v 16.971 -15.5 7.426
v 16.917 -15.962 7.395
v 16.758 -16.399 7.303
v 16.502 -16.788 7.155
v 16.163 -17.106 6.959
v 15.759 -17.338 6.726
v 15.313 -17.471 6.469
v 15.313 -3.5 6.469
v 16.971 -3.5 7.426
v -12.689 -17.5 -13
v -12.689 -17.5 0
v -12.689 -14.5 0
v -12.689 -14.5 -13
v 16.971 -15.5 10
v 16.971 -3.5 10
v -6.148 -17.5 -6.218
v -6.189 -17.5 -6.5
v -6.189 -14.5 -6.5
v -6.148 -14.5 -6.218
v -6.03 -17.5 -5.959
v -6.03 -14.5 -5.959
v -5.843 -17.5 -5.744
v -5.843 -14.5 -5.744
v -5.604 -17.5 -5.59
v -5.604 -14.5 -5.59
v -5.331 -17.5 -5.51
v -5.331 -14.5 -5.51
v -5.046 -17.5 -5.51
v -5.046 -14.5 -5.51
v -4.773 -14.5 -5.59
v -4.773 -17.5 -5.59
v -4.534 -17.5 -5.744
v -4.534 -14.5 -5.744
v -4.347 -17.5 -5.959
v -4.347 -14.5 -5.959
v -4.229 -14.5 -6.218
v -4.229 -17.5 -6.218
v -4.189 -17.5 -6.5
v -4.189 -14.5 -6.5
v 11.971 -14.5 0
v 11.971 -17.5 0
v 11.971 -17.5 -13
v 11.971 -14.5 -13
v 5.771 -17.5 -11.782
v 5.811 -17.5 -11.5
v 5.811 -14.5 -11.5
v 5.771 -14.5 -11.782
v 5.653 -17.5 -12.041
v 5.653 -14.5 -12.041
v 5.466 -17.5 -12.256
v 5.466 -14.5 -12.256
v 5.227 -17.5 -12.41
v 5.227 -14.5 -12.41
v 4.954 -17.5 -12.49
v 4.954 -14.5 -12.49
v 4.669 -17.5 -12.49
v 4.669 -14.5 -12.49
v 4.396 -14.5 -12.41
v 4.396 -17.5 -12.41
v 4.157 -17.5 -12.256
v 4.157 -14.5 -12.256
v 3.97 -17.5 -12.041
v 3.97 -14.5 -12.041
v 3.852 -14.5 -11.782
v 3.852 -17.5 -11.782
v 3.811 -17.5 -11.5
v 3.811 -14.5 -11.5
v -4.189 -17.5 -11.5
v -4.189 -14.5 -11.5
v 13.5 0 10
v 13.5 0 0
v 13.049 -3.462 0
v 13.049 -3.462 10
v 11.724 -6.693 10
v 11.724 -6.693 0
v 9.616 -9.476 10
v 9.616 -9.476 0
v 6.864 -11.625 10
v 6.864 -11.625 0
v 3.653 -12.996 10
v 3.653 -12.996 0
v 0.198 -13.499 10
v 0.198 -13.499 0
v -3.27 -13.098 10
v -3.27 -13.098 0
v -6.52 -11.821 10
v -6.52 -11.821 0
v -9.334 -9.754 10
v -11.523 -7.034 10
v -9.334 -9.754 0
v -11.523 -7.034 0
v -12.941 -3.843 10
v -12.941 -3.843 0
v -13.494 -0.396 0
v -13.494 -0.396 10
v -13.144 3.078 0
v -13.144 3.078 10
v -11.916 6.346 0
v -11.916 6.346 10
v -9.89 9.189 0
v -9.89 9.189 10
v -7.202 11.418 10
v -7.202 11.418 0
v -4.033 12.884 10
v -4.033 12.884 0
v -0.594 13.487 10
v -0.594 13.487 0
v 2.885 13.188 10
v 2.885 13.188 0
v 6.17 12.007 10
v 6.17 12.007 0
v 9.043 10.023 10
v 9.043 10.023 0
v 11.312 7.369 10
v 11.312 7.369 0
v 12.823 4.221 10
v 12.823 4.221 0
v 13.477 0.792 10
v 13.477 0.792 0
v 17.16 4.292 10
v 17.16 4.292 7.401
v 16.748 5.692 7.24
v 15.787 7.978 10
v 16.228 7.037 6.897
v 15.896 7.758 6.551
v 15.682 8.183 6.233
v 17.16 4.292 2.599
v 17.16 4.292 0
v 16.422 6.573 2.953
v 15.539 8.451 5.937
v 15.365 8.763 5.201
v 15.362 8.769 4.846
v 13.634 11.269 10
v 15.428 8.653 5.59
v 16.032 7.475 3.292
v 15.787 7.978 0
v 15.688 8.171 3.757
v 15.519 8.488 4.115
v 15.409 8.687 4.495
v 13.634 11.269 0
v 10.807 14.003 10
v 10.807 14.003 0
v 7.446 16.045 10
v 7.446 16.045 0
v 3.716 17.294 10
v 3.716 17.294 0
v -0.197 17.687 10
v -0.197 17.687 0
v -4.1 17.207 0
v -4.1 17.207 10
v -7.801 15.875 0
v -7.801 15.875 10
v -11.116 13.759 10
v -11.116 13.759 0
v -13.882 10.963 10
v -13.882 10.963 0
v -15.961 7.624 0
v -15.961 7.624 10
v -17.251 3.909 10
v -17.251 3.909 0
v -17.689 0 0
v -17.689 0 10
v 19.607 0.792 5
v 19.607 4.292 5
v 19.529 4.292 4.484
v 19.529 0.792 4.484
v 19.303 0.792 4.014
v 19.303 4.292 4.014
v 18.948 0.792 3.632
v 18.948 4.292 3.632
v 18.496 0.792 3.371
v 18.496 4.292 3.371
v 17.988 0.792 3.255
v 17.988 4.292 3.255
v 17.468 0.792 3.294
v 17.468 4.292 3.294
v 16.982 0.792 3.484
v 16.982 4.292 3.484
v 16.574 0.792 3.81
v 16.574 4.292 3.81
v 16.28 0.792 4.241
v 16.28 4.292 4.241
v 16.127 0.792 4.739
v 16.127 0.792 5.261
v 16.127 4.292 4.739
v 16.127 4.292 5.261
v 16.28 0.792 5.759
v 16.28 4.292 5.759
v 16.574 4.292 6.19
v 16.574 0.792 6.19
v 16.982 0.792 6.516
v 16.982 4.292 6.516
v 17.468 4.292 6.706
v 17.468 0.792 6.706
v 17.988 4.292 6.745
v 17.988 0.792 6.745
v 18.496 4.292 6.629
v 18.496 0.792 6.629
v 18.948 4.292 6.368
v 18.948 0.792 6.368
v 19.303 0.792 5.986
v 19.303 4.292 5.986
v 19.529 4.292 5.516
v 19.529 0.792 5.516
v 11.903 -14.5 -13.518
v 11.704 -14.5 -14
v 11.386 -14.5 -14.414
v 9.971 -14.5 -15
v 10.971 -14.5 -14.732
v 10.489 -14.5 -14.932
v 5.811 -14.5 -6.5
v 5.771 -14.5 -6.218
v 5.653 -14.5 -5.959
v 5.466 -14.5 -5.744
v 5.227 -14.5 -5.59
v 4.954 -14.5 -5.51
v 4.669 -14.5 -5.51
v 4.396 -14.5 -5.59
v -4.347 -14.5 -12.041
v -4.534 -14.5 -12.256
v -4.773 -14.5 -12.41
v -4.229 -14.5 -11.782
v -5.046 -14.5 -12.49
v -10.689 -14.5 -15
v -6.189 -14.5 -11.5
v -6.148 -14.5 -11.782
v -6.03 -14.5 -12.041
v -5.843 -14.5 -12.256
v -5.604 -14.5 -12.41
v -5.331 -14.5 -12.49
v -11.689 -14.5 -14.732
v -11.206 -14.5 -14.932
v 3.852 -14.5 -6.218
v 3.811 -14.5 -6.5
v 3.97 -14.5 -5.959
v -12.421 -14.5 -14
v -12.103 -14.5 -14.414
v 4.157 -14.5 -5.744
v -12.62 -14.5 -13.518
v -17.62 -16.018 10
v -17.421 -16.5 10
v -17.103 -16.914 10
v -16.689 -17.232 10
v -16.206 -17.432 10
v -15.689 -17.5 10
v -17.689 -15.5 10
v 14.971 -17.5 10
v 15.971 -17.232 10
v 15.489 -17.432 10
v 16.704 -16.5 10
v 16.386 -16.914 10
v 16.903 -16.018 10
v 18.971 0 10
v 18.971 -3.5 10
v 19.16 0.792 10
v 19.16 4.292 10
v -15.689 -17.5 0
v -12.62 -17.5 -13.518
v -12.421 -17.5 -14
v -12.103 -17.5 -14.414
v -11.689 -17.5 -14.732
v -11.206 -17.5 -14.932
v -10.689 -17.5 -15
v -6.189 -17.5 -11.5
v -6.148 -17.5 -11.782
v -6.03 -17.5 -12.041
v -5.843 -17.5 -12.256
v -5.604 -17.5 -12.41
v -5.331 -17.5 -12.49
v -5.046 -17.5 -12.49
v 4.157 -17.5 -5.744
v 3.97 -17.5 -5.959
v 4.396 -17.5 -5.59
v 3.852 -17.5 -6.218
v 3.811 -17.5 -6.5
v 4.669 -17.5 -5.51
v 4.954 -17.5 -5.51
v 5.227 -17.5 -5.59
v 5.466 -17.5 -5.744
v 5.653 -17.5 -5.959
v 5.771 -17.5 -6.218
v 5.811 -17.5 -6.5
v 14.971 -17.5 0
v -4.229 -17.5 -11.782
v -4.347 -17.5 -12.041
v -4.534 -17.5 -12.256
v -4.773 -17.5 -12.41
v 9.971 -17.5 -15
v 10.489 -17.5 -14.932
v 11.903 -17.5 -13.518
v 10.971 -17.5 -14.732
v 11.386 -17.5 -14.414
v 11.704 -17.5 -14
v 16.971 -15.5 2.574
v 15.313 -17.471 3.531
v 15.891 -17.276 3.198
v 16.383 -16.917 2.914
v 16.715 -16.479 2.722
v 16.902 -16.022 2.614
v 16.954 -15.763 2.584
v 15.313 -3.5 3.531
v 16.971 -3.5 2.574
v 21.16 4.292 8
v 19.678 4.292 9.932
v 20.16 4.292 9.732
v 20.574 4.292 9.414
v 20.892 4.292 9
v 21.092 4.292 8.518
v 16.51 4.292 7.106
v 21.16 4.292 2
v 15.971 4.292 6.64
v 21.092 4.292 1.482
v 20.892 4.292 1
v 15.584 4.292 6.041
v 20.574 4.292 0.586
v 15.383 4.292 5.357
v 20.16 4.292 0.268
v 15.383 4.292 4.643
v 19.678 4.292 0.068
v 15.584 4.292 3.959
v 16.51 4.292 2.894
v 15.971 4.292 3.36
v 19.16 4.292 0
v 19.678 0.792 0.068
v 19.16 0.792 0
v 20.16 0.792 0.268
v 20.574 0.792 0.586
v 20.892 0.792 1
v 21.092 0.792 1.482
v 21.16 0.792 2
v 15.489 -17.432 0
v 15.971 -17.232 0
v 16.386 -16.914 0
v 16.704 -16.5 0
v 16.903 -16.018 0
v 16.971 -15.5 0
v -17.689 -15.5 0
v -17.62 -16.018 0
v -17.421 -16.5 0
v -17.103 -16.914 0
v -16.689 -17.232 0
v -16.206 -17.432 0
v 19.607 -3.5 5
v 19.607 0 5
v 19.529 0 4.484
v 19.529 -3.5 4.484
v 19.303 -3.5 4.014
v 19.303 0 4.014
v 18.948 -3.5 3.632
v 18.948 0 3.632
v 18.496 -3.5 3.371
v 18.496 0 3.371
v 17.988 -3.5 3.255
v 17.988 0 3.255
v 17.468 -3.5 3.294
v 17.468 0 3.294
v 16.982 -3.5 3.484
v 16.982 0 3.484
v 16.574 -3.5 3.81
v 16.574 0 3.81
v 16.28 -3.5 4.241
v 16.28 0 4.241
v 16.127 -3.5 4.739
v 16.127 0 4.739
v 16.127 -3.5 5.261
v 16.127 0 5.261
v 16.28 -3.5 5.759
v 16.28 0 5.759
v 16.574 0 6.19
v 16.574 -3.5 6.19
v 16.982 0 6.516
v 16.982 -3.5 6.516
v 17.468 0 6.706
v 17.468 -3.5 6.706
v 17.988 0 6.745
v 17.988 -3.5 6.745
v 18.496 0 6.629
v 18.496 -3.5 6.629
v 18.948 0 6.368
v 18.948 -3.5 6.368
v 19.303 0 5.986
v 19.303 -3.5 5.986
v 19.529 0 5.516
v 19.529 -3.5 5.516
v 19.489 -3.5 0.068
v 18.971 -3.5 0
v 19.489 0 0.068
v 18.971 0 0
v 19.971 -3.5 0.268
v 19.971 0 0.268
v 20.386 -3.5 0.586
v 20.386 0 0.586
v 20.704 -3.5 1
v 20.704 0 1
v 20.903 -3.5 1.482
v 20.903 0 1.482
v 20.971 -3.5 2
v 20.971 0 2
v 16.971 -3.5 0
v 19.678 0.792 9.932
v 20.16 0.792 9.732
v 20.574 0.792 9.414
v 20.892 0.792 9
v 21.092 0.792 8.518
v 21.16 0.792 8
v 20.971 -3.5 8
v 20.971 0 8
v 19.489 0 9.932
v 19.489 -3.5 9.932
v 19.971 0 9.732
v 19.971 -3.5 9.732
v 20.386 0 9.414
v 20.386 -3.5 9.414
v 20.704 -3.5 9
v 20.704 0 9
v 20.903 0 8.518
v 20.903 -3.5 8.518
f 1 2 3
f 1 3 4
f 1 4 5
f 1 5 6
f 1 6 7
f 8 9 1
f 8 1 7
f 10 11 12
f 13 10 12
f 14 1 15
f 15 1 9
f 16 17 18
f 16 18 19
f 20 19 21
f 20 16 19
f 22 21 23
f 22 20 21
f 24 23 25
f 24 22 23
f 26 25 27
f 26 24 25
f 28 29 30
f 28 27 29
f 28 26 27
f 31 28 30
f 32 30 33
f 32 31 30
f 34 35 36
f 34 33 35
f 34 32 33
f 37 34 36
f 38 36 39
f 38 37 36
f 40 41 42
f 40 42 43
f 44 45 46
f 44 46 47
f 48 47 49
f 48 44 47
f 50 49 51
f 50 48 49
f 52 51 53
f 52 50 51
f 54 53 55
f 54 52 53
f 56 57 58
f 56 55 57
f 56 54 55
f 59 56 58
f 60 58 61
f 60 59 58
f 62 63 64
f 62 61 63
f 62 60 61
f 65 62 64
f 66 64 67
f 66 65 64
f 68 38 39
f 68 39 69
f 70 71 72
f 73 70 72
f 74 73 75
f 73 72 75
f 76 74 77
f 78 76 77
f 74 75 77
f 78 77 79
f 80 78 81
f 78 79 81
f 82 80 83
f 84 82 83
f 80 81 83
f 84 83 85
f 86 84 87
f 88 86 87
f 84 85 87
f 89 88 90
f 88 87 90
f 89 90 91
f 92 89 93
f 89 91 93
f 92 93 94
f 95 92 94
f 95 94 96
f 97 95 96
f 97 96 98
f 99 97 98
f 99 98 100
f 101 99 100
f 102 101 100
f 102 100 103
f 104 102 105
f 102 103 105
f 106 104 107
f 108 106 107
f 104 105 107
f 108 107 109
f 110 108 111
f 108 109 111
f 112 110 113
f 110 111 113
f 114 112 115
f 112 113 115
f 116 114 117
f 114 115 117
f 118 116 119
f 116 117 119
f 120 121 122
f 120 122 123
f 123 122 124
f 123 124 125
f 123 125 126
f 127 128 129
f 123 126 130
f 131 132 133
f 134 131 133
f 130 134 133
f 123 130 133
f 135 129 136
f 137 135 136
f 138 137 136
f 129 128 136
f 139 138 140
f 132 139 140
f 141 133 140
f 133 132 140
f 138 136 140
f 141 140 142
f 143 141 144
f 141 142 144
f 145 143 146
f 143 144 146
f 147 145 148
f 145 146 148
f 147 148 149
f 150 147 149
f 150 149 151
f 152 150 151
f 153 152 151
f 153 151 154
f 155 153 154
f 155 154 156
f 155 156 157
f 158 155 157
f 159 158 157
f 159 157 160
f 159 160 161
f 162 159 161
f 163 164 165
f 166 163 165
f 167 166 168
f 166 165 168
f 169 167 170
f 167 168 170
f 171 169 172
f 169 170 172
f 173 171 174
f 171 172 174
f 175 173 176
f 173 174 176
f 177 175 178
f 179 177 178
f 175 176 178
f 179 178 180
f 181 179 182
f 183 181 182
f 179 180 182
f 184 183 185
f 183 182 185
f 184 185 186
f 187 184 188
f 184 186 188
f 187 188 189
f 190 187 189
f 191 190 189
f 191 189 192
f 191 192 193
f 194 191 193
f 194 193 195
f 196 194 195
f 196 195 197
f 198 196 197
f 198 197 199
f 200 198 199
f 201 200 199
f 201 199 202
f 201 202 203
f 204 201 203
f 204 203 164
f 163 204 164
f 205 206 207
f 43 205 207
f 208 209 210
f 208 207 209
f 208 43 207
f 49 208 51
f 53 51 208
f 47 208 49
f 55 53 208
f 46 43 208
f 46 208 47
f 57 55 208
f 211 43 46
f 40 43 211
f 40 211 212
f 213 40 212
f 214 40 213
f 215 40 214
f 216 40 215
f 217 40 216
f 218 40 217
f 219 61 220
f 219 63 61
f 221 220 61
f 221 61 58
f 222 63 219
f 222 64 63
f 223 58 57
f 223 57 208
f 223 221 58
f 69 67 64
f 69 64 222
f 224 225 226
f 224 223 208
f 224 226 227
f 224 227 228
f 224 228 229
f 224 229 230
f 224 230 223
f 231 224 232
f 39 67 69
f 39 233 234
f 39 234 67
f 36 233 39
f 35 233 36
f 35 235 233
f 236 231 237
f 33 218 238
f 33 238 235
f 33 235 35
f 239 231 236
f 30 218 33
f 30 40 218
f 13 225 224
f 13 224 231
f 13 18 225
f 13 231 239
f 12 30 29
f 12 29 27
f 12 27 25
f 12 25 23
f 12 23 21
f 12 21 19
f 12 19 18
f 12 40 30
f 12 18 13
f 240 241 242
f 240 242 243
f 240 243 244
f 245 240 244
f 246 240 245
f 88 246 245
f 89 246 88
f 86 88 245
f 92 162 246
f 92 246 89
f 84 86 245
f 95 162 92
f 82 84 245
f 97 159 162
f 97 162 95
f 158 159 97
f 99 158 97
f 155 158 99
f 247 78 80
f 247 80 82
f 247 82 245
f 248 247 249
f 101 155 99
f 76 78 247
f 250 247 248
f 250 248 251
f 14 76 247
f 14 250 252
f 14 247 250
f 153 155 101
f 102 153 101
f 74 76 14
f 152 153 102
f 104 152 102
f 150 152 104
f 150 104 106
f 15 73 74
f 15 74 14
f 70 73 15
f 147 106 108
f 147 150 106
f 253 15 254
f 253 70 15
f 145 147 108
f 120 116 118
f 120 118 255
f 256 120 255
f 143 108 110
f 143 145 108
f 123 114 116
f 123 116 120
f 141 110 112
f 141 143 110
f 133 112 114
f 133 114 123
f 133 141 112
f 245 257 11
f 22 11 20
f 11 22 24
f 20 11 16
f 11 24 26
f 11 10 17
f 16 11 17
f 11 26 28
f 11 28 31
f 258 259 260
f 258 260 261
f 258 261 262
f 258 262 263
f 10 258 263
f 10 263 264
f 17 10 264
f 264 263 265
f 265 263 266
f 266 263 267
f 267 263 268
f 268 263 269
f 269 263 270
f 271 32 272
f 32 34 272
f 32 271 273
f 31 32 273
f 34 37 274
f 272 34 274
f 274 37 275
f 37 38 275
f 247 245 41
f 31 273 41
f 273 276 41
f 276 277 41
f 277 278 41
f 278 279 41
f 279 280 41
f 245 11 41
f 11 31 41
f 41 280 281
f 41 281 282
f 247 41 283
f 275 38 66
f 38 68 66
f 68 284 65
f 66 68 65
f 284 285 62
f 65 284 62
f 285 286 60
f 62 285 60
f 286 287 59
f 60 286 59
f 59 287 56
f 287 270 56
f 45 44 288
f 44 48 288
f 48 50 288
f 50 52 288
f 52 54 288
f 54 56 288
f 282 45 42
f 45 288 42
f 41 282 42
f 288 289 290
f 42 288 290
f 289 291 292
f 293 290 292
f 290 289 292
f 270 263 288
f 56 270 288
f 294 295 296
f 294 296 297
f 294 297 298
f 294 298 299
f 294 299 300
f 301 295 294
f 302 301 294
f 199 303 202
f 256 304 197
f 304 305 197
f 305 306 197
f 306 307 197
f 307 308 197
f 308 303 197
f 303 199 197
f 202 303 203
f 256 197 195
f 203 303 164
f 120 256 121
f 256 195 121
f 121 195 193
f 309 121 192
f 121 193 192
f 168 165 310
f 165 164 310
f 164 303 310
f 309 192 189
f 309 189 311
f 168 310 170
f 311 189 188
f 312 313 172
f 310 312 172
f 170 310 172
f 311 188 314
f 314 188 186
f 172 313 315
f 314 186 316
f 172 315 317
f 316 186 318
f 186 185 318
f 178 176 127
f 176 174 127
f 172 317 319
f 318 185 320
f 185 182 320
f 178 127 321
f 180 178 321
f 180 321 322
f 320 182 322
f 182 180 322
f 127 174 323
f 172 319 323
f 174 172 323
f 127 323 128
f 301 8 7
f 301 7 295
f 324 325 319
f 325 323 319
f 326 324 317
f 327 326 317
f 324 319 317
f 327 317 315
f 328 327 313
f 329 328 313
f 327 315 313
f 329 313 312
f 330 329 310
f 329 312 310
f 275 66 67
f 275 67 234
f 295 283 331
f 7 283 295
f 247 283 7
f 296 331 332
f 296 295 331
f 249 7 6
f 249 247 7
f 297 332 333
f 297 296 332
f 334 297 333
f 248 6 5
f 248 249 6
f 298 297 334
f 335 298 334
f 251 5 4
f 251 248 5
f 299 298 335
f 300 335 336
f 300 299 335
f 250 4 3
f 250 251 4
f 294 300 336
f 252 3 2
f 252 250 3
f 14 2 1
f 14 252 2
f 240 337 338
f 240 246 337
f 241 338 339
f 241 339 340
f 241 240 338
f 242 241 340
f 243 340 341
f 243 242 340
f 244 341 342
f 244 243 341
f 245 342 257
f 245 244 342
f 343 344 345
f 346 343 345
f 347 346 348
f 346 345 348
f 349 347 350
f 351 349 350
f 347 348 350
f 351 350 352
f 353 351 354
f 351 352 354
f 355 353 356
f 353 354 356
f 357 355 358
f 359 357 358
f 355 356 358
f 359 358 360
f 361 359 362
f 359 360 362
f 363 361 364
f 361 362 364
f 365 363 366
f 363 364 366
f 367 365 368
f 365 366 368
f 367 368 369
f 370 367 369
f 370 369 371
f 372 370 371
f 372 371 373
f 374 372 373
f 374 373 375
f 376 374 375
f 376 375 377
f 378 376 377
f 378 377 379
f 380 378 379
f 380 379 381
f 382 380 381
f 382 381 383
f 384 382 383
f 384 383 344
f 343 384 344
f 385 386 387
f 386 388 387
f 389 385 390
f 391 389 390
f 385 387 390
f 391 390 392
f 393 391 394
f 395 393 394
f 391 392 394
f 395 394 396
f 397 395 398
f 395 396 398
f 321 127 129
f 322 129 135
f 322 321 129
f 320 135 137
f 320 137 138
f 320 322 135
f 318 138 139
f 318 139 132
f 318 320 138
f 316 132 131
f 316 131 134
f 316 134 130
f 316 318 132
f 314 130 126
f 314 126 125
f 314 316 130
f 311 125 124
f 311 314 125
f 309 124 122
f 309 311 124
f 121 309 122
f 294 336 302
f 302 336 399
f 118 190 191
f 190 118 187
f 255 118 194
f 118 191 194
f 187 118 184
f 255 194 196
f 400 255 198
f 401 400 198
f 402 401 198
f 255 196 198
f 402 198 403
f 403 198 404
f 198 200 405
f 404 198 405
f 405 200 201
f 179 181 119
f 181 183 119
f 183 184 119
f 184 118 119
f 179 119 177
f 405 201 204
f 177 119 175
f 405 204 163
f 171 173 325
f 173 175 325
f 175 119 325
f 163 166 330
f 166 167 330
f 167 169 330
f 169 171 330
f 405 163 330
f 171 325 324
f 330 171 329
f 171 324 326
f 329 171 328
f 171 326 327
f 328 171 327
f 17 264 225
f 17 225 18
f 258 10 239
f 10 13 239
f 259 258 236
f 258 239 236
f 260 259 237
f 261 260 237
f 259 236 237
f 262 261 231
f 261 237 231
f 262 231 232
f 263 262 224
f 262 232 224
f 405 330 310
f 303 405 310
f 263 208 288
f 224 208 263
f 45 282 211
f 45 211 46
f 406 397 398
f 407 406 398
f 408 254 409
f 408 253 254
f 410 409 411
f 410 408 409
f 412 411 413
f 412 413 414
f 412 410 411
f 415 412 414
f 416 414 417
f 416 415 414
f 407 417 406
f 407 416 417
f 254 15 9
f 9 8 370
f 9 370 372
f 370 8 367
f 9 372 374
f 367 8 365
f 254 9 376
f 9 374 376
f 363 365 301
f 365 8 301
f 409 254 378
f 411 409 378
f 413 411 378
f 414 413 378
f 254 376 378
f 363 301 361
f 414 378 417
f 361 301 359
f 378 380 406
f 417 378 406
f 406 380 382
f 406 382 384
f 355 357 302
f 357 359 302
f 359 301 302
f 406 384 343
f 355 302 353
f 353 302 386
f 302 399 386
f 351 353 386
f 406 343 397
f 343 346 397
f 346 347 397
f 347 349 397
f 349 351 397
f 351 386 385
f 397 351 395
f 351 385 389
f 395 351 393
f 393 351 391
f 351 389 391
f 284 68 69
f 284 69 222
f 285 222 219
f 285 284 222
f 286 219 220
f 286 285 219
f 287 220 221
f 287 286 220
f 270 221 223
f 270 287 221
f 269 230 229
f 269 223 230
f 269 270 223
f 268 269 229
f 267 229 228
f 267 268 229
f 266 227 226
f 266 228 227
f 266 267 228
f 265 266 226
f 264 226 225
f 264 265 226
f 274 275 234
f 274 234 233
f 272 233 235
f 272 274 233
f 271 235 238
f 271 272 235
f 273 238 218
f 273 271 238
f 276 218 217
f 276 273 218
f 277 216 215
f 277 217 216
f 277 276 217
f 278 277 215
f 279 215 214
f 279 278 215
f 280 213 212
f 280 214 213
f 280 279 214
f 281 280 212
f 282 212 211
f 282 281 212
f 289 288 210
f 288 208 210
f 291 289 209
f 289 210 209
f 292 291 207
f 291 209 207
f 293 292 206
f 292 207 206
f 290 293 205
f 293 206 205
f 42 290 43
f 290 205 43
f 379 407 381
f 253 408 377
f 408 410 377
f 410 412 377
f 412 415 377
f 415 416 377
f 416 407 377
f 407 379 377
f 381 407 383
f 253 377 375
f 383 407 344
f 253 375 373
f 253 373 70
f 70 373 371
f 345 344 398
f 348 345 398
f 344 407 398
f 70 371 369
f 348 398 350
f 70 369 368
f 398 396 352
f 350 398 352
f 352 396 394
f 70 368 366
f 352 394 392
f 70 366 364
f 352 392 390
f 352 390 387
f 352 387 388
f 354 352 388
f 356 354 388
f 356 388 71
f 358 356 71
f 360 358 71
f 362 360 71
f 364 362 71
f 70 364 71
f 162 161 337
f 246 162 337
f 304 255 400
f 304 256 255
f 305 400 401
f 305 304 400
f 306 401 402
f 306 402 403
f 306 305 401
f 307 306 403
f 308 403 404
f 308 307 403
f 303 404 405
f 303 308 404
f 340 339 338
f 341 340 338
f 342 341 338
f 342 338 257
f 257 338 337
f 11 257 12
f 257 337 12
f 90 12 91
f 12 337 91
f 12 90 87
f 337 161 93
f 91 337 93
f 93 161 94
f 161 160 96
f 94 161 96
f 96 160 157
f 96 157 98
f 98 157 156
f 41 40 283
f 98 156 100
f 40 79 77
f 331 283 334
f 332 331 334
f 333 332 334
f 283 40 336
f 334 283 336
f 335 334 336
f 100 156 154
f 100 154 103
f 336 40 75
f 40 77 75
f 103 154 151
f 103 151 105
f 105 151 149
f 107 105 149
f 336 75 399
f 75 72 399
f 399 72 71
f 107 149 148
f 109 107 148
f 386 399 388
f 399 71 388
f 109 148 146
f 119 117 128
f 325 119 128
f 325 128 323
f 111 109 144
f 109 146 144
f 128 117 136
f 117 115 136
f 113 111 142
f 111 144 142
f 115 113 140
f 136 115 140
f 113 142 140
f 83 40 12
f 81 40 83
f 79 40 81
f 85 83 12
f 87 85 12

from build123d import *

# Parameters (mm, degrees)
SALIENTE_EXTRUIR1_DEPTH    = 10
CROQUIS2_W                 = 24.660026533
CROQUIS2_H                 = 3
SALIENTE_EXTRUIR2_DEPTH    = 15
CORTAR_EXTRUIR1_DEPTH      = 15
REDONDEO1_R                = 2
CROQUIS4_R                 = 1.75
CORTAR_EXTRUIR2_DEPTH      = 15
CORTAR_EXTRUIR2_DEPTH_BACK = 25
CROQUIS5_R                 = 2.5
CORTAR_EXTRUIR3_DEPTH      = 25
CORTAR_EXTRUIR4_DEPTH      = 25


with BuildPart() as part:
    # Croquis1 → Saliente-Extruir1 (new body)
    with BuildSketch(Plane.XY):
        with BuildLine():
            Line((-17.688572934, 0), (-17.688572934, -17.5))
            Line((-17.688572934, -17.5), (16.971453599, -17.5))
            Line((16.971453599, -17.5), (16.971453599, -3.5))
            Line((16.971453599, -3.5), (20.971453599, -3.5))
            Line((20.971453599, -3.5), (20.971453599, 0))
            Line((20.971453599, 0), (13.5, 0))
            ThreePointArc((13.5, 0), (-13.494189444, -0.396044516), (13.476762776, 0.791748108))
            Line((13.476762776, 0.791748108), (21.160026533, 0.791748108))
            Line((21.160026533, 0.791748108), (21.160026533, 4.291748108))
            Line((21.160026533, 4.291748108), (17.160026533, 4.291748108))
            ThreePointArc((17.160026533, 4.291748108), (-2.162085979, 17.555939071), (-17.688572934, 0))
        make_face()
    extrude(amount=SALIENTE_EXTRUIR1_DEPTH)

    # Croquis2 → Saliente-Extruir2 (add)
    with BuildSketch(Plane(origin=(0, 0, 0), x_dir=(-1, 0, 0), z_dir=(0, 0, -1))):
        with Locations((0.358559668, -16)):
            Rectangle(CROQUIS2_W, CROQUIS2_H)
    extrude(amount=SALIENTE_EXTRUIR2_DEPTH)

    # Croquis3 → Cortar-Extruir1 (cut)
    with BuildSketch(Plane.XZ.offset(17.5)):
        with BuildLine():
            Line((5.811427066, -6.5), (5.811427066, -11.5))
            ThreePointArc((5.811427066, -11.5), (4.811427066, -12.5), (3.811427066, -11.5))
            Line((3.811427066, -11.5), (3.811427066, -6.5))
            ThreePointArc((3.811427066, -6.5), (4.811427066, -5.5), (5.811427066, -6.5))
        make_face()
        with BuildLine():
            Line((-4.188572934, -6.5), (-4.188572934, -11.5))
            ThreePointArc((-4.188572934, -11.5), (-5.188572934, -12.5), (-6.188572934, -11.5))
            Line((-6.188572934, -11.5), (-6.188572934, -6.5))
            ThreePointArc((-6.188572934, -6.5), (-5.188572934, -5.5), (-4.188572934, -6.5))
        make_face()
    extrude(amount=-CORTAR_EXTRUIR1_DEPTH, mode=Mode.SUBTRACT)

    # Redondeo1
    redondeo1_edges = [part.edges().sort_by_distance(p)[0] for p in [
        (16.971453599, -17.5, 5),
        (-17.688572934, -17.5, 5),
        (11.971453599, -16, -15),
        (-12.688572934, -16, -15),
        (21.160026533, 2.541748108, 10),
        (20.971453599, -1.75, 10),
        (20.971453599, -1.75, 0),
        (21.160026533, 2.541748108, 0),
    ]]
    fillet(redondeo1_edges, radius=REDONDEO1_R)

    # Croquis4 → Cortar-Extruir2 (cut, two sides)
    with BuildSketch(Plane(origin=(0, 4.291748108, 0), x_dir=(1, 0, 0), z_dir=(0, 1, 0))) as cortar_extruir2_sk:
        with Locations((17.857152829, -5)):
            Circle(CROQUIS4_R)
    extrude(amount=CORTAR_EXTRUIR2_DEPTH, mode=Mode.SUBTRACT)
    extrude(cortar_extruir2_sk.sketch, amount=-CORTAR_EXTRUIR2_DEPTH_BACK, mode=Mode.SUBTRACT)

    # Croquis5 → Cortar-Extruir3 (cut)
    with BuildSketch(Plane(origin=(0, 4.291748108, 0), x_dir=(1, 0, 0), z_dir=(0, 1, 0))):
        with Locations((17.857152829, -5)):
            Circle(CROQUIS5_R)
    extrude(amount=CORTAR_EXTRUIR3_DEPTH, mode=Mode.SUBTRACT)

    # Croquis8 → Cortar-Extruir4 (cut)
    with BuildSketch(Plane.XZ.offset(3.5)):
        Polygon((17.857152829, 7.937414178), (15.313277529, 6.468707089), (15.313277529, 3.531292911), (17.857152829, 2.062585822), (20.401028129, 3.531292911), (20.401028129, 6.468707089), align=None)
    extrude(amount=CORTAR_EXTRUIR4_DEPTH, mode=Mode.SUBTRACT)


solid = part.part
